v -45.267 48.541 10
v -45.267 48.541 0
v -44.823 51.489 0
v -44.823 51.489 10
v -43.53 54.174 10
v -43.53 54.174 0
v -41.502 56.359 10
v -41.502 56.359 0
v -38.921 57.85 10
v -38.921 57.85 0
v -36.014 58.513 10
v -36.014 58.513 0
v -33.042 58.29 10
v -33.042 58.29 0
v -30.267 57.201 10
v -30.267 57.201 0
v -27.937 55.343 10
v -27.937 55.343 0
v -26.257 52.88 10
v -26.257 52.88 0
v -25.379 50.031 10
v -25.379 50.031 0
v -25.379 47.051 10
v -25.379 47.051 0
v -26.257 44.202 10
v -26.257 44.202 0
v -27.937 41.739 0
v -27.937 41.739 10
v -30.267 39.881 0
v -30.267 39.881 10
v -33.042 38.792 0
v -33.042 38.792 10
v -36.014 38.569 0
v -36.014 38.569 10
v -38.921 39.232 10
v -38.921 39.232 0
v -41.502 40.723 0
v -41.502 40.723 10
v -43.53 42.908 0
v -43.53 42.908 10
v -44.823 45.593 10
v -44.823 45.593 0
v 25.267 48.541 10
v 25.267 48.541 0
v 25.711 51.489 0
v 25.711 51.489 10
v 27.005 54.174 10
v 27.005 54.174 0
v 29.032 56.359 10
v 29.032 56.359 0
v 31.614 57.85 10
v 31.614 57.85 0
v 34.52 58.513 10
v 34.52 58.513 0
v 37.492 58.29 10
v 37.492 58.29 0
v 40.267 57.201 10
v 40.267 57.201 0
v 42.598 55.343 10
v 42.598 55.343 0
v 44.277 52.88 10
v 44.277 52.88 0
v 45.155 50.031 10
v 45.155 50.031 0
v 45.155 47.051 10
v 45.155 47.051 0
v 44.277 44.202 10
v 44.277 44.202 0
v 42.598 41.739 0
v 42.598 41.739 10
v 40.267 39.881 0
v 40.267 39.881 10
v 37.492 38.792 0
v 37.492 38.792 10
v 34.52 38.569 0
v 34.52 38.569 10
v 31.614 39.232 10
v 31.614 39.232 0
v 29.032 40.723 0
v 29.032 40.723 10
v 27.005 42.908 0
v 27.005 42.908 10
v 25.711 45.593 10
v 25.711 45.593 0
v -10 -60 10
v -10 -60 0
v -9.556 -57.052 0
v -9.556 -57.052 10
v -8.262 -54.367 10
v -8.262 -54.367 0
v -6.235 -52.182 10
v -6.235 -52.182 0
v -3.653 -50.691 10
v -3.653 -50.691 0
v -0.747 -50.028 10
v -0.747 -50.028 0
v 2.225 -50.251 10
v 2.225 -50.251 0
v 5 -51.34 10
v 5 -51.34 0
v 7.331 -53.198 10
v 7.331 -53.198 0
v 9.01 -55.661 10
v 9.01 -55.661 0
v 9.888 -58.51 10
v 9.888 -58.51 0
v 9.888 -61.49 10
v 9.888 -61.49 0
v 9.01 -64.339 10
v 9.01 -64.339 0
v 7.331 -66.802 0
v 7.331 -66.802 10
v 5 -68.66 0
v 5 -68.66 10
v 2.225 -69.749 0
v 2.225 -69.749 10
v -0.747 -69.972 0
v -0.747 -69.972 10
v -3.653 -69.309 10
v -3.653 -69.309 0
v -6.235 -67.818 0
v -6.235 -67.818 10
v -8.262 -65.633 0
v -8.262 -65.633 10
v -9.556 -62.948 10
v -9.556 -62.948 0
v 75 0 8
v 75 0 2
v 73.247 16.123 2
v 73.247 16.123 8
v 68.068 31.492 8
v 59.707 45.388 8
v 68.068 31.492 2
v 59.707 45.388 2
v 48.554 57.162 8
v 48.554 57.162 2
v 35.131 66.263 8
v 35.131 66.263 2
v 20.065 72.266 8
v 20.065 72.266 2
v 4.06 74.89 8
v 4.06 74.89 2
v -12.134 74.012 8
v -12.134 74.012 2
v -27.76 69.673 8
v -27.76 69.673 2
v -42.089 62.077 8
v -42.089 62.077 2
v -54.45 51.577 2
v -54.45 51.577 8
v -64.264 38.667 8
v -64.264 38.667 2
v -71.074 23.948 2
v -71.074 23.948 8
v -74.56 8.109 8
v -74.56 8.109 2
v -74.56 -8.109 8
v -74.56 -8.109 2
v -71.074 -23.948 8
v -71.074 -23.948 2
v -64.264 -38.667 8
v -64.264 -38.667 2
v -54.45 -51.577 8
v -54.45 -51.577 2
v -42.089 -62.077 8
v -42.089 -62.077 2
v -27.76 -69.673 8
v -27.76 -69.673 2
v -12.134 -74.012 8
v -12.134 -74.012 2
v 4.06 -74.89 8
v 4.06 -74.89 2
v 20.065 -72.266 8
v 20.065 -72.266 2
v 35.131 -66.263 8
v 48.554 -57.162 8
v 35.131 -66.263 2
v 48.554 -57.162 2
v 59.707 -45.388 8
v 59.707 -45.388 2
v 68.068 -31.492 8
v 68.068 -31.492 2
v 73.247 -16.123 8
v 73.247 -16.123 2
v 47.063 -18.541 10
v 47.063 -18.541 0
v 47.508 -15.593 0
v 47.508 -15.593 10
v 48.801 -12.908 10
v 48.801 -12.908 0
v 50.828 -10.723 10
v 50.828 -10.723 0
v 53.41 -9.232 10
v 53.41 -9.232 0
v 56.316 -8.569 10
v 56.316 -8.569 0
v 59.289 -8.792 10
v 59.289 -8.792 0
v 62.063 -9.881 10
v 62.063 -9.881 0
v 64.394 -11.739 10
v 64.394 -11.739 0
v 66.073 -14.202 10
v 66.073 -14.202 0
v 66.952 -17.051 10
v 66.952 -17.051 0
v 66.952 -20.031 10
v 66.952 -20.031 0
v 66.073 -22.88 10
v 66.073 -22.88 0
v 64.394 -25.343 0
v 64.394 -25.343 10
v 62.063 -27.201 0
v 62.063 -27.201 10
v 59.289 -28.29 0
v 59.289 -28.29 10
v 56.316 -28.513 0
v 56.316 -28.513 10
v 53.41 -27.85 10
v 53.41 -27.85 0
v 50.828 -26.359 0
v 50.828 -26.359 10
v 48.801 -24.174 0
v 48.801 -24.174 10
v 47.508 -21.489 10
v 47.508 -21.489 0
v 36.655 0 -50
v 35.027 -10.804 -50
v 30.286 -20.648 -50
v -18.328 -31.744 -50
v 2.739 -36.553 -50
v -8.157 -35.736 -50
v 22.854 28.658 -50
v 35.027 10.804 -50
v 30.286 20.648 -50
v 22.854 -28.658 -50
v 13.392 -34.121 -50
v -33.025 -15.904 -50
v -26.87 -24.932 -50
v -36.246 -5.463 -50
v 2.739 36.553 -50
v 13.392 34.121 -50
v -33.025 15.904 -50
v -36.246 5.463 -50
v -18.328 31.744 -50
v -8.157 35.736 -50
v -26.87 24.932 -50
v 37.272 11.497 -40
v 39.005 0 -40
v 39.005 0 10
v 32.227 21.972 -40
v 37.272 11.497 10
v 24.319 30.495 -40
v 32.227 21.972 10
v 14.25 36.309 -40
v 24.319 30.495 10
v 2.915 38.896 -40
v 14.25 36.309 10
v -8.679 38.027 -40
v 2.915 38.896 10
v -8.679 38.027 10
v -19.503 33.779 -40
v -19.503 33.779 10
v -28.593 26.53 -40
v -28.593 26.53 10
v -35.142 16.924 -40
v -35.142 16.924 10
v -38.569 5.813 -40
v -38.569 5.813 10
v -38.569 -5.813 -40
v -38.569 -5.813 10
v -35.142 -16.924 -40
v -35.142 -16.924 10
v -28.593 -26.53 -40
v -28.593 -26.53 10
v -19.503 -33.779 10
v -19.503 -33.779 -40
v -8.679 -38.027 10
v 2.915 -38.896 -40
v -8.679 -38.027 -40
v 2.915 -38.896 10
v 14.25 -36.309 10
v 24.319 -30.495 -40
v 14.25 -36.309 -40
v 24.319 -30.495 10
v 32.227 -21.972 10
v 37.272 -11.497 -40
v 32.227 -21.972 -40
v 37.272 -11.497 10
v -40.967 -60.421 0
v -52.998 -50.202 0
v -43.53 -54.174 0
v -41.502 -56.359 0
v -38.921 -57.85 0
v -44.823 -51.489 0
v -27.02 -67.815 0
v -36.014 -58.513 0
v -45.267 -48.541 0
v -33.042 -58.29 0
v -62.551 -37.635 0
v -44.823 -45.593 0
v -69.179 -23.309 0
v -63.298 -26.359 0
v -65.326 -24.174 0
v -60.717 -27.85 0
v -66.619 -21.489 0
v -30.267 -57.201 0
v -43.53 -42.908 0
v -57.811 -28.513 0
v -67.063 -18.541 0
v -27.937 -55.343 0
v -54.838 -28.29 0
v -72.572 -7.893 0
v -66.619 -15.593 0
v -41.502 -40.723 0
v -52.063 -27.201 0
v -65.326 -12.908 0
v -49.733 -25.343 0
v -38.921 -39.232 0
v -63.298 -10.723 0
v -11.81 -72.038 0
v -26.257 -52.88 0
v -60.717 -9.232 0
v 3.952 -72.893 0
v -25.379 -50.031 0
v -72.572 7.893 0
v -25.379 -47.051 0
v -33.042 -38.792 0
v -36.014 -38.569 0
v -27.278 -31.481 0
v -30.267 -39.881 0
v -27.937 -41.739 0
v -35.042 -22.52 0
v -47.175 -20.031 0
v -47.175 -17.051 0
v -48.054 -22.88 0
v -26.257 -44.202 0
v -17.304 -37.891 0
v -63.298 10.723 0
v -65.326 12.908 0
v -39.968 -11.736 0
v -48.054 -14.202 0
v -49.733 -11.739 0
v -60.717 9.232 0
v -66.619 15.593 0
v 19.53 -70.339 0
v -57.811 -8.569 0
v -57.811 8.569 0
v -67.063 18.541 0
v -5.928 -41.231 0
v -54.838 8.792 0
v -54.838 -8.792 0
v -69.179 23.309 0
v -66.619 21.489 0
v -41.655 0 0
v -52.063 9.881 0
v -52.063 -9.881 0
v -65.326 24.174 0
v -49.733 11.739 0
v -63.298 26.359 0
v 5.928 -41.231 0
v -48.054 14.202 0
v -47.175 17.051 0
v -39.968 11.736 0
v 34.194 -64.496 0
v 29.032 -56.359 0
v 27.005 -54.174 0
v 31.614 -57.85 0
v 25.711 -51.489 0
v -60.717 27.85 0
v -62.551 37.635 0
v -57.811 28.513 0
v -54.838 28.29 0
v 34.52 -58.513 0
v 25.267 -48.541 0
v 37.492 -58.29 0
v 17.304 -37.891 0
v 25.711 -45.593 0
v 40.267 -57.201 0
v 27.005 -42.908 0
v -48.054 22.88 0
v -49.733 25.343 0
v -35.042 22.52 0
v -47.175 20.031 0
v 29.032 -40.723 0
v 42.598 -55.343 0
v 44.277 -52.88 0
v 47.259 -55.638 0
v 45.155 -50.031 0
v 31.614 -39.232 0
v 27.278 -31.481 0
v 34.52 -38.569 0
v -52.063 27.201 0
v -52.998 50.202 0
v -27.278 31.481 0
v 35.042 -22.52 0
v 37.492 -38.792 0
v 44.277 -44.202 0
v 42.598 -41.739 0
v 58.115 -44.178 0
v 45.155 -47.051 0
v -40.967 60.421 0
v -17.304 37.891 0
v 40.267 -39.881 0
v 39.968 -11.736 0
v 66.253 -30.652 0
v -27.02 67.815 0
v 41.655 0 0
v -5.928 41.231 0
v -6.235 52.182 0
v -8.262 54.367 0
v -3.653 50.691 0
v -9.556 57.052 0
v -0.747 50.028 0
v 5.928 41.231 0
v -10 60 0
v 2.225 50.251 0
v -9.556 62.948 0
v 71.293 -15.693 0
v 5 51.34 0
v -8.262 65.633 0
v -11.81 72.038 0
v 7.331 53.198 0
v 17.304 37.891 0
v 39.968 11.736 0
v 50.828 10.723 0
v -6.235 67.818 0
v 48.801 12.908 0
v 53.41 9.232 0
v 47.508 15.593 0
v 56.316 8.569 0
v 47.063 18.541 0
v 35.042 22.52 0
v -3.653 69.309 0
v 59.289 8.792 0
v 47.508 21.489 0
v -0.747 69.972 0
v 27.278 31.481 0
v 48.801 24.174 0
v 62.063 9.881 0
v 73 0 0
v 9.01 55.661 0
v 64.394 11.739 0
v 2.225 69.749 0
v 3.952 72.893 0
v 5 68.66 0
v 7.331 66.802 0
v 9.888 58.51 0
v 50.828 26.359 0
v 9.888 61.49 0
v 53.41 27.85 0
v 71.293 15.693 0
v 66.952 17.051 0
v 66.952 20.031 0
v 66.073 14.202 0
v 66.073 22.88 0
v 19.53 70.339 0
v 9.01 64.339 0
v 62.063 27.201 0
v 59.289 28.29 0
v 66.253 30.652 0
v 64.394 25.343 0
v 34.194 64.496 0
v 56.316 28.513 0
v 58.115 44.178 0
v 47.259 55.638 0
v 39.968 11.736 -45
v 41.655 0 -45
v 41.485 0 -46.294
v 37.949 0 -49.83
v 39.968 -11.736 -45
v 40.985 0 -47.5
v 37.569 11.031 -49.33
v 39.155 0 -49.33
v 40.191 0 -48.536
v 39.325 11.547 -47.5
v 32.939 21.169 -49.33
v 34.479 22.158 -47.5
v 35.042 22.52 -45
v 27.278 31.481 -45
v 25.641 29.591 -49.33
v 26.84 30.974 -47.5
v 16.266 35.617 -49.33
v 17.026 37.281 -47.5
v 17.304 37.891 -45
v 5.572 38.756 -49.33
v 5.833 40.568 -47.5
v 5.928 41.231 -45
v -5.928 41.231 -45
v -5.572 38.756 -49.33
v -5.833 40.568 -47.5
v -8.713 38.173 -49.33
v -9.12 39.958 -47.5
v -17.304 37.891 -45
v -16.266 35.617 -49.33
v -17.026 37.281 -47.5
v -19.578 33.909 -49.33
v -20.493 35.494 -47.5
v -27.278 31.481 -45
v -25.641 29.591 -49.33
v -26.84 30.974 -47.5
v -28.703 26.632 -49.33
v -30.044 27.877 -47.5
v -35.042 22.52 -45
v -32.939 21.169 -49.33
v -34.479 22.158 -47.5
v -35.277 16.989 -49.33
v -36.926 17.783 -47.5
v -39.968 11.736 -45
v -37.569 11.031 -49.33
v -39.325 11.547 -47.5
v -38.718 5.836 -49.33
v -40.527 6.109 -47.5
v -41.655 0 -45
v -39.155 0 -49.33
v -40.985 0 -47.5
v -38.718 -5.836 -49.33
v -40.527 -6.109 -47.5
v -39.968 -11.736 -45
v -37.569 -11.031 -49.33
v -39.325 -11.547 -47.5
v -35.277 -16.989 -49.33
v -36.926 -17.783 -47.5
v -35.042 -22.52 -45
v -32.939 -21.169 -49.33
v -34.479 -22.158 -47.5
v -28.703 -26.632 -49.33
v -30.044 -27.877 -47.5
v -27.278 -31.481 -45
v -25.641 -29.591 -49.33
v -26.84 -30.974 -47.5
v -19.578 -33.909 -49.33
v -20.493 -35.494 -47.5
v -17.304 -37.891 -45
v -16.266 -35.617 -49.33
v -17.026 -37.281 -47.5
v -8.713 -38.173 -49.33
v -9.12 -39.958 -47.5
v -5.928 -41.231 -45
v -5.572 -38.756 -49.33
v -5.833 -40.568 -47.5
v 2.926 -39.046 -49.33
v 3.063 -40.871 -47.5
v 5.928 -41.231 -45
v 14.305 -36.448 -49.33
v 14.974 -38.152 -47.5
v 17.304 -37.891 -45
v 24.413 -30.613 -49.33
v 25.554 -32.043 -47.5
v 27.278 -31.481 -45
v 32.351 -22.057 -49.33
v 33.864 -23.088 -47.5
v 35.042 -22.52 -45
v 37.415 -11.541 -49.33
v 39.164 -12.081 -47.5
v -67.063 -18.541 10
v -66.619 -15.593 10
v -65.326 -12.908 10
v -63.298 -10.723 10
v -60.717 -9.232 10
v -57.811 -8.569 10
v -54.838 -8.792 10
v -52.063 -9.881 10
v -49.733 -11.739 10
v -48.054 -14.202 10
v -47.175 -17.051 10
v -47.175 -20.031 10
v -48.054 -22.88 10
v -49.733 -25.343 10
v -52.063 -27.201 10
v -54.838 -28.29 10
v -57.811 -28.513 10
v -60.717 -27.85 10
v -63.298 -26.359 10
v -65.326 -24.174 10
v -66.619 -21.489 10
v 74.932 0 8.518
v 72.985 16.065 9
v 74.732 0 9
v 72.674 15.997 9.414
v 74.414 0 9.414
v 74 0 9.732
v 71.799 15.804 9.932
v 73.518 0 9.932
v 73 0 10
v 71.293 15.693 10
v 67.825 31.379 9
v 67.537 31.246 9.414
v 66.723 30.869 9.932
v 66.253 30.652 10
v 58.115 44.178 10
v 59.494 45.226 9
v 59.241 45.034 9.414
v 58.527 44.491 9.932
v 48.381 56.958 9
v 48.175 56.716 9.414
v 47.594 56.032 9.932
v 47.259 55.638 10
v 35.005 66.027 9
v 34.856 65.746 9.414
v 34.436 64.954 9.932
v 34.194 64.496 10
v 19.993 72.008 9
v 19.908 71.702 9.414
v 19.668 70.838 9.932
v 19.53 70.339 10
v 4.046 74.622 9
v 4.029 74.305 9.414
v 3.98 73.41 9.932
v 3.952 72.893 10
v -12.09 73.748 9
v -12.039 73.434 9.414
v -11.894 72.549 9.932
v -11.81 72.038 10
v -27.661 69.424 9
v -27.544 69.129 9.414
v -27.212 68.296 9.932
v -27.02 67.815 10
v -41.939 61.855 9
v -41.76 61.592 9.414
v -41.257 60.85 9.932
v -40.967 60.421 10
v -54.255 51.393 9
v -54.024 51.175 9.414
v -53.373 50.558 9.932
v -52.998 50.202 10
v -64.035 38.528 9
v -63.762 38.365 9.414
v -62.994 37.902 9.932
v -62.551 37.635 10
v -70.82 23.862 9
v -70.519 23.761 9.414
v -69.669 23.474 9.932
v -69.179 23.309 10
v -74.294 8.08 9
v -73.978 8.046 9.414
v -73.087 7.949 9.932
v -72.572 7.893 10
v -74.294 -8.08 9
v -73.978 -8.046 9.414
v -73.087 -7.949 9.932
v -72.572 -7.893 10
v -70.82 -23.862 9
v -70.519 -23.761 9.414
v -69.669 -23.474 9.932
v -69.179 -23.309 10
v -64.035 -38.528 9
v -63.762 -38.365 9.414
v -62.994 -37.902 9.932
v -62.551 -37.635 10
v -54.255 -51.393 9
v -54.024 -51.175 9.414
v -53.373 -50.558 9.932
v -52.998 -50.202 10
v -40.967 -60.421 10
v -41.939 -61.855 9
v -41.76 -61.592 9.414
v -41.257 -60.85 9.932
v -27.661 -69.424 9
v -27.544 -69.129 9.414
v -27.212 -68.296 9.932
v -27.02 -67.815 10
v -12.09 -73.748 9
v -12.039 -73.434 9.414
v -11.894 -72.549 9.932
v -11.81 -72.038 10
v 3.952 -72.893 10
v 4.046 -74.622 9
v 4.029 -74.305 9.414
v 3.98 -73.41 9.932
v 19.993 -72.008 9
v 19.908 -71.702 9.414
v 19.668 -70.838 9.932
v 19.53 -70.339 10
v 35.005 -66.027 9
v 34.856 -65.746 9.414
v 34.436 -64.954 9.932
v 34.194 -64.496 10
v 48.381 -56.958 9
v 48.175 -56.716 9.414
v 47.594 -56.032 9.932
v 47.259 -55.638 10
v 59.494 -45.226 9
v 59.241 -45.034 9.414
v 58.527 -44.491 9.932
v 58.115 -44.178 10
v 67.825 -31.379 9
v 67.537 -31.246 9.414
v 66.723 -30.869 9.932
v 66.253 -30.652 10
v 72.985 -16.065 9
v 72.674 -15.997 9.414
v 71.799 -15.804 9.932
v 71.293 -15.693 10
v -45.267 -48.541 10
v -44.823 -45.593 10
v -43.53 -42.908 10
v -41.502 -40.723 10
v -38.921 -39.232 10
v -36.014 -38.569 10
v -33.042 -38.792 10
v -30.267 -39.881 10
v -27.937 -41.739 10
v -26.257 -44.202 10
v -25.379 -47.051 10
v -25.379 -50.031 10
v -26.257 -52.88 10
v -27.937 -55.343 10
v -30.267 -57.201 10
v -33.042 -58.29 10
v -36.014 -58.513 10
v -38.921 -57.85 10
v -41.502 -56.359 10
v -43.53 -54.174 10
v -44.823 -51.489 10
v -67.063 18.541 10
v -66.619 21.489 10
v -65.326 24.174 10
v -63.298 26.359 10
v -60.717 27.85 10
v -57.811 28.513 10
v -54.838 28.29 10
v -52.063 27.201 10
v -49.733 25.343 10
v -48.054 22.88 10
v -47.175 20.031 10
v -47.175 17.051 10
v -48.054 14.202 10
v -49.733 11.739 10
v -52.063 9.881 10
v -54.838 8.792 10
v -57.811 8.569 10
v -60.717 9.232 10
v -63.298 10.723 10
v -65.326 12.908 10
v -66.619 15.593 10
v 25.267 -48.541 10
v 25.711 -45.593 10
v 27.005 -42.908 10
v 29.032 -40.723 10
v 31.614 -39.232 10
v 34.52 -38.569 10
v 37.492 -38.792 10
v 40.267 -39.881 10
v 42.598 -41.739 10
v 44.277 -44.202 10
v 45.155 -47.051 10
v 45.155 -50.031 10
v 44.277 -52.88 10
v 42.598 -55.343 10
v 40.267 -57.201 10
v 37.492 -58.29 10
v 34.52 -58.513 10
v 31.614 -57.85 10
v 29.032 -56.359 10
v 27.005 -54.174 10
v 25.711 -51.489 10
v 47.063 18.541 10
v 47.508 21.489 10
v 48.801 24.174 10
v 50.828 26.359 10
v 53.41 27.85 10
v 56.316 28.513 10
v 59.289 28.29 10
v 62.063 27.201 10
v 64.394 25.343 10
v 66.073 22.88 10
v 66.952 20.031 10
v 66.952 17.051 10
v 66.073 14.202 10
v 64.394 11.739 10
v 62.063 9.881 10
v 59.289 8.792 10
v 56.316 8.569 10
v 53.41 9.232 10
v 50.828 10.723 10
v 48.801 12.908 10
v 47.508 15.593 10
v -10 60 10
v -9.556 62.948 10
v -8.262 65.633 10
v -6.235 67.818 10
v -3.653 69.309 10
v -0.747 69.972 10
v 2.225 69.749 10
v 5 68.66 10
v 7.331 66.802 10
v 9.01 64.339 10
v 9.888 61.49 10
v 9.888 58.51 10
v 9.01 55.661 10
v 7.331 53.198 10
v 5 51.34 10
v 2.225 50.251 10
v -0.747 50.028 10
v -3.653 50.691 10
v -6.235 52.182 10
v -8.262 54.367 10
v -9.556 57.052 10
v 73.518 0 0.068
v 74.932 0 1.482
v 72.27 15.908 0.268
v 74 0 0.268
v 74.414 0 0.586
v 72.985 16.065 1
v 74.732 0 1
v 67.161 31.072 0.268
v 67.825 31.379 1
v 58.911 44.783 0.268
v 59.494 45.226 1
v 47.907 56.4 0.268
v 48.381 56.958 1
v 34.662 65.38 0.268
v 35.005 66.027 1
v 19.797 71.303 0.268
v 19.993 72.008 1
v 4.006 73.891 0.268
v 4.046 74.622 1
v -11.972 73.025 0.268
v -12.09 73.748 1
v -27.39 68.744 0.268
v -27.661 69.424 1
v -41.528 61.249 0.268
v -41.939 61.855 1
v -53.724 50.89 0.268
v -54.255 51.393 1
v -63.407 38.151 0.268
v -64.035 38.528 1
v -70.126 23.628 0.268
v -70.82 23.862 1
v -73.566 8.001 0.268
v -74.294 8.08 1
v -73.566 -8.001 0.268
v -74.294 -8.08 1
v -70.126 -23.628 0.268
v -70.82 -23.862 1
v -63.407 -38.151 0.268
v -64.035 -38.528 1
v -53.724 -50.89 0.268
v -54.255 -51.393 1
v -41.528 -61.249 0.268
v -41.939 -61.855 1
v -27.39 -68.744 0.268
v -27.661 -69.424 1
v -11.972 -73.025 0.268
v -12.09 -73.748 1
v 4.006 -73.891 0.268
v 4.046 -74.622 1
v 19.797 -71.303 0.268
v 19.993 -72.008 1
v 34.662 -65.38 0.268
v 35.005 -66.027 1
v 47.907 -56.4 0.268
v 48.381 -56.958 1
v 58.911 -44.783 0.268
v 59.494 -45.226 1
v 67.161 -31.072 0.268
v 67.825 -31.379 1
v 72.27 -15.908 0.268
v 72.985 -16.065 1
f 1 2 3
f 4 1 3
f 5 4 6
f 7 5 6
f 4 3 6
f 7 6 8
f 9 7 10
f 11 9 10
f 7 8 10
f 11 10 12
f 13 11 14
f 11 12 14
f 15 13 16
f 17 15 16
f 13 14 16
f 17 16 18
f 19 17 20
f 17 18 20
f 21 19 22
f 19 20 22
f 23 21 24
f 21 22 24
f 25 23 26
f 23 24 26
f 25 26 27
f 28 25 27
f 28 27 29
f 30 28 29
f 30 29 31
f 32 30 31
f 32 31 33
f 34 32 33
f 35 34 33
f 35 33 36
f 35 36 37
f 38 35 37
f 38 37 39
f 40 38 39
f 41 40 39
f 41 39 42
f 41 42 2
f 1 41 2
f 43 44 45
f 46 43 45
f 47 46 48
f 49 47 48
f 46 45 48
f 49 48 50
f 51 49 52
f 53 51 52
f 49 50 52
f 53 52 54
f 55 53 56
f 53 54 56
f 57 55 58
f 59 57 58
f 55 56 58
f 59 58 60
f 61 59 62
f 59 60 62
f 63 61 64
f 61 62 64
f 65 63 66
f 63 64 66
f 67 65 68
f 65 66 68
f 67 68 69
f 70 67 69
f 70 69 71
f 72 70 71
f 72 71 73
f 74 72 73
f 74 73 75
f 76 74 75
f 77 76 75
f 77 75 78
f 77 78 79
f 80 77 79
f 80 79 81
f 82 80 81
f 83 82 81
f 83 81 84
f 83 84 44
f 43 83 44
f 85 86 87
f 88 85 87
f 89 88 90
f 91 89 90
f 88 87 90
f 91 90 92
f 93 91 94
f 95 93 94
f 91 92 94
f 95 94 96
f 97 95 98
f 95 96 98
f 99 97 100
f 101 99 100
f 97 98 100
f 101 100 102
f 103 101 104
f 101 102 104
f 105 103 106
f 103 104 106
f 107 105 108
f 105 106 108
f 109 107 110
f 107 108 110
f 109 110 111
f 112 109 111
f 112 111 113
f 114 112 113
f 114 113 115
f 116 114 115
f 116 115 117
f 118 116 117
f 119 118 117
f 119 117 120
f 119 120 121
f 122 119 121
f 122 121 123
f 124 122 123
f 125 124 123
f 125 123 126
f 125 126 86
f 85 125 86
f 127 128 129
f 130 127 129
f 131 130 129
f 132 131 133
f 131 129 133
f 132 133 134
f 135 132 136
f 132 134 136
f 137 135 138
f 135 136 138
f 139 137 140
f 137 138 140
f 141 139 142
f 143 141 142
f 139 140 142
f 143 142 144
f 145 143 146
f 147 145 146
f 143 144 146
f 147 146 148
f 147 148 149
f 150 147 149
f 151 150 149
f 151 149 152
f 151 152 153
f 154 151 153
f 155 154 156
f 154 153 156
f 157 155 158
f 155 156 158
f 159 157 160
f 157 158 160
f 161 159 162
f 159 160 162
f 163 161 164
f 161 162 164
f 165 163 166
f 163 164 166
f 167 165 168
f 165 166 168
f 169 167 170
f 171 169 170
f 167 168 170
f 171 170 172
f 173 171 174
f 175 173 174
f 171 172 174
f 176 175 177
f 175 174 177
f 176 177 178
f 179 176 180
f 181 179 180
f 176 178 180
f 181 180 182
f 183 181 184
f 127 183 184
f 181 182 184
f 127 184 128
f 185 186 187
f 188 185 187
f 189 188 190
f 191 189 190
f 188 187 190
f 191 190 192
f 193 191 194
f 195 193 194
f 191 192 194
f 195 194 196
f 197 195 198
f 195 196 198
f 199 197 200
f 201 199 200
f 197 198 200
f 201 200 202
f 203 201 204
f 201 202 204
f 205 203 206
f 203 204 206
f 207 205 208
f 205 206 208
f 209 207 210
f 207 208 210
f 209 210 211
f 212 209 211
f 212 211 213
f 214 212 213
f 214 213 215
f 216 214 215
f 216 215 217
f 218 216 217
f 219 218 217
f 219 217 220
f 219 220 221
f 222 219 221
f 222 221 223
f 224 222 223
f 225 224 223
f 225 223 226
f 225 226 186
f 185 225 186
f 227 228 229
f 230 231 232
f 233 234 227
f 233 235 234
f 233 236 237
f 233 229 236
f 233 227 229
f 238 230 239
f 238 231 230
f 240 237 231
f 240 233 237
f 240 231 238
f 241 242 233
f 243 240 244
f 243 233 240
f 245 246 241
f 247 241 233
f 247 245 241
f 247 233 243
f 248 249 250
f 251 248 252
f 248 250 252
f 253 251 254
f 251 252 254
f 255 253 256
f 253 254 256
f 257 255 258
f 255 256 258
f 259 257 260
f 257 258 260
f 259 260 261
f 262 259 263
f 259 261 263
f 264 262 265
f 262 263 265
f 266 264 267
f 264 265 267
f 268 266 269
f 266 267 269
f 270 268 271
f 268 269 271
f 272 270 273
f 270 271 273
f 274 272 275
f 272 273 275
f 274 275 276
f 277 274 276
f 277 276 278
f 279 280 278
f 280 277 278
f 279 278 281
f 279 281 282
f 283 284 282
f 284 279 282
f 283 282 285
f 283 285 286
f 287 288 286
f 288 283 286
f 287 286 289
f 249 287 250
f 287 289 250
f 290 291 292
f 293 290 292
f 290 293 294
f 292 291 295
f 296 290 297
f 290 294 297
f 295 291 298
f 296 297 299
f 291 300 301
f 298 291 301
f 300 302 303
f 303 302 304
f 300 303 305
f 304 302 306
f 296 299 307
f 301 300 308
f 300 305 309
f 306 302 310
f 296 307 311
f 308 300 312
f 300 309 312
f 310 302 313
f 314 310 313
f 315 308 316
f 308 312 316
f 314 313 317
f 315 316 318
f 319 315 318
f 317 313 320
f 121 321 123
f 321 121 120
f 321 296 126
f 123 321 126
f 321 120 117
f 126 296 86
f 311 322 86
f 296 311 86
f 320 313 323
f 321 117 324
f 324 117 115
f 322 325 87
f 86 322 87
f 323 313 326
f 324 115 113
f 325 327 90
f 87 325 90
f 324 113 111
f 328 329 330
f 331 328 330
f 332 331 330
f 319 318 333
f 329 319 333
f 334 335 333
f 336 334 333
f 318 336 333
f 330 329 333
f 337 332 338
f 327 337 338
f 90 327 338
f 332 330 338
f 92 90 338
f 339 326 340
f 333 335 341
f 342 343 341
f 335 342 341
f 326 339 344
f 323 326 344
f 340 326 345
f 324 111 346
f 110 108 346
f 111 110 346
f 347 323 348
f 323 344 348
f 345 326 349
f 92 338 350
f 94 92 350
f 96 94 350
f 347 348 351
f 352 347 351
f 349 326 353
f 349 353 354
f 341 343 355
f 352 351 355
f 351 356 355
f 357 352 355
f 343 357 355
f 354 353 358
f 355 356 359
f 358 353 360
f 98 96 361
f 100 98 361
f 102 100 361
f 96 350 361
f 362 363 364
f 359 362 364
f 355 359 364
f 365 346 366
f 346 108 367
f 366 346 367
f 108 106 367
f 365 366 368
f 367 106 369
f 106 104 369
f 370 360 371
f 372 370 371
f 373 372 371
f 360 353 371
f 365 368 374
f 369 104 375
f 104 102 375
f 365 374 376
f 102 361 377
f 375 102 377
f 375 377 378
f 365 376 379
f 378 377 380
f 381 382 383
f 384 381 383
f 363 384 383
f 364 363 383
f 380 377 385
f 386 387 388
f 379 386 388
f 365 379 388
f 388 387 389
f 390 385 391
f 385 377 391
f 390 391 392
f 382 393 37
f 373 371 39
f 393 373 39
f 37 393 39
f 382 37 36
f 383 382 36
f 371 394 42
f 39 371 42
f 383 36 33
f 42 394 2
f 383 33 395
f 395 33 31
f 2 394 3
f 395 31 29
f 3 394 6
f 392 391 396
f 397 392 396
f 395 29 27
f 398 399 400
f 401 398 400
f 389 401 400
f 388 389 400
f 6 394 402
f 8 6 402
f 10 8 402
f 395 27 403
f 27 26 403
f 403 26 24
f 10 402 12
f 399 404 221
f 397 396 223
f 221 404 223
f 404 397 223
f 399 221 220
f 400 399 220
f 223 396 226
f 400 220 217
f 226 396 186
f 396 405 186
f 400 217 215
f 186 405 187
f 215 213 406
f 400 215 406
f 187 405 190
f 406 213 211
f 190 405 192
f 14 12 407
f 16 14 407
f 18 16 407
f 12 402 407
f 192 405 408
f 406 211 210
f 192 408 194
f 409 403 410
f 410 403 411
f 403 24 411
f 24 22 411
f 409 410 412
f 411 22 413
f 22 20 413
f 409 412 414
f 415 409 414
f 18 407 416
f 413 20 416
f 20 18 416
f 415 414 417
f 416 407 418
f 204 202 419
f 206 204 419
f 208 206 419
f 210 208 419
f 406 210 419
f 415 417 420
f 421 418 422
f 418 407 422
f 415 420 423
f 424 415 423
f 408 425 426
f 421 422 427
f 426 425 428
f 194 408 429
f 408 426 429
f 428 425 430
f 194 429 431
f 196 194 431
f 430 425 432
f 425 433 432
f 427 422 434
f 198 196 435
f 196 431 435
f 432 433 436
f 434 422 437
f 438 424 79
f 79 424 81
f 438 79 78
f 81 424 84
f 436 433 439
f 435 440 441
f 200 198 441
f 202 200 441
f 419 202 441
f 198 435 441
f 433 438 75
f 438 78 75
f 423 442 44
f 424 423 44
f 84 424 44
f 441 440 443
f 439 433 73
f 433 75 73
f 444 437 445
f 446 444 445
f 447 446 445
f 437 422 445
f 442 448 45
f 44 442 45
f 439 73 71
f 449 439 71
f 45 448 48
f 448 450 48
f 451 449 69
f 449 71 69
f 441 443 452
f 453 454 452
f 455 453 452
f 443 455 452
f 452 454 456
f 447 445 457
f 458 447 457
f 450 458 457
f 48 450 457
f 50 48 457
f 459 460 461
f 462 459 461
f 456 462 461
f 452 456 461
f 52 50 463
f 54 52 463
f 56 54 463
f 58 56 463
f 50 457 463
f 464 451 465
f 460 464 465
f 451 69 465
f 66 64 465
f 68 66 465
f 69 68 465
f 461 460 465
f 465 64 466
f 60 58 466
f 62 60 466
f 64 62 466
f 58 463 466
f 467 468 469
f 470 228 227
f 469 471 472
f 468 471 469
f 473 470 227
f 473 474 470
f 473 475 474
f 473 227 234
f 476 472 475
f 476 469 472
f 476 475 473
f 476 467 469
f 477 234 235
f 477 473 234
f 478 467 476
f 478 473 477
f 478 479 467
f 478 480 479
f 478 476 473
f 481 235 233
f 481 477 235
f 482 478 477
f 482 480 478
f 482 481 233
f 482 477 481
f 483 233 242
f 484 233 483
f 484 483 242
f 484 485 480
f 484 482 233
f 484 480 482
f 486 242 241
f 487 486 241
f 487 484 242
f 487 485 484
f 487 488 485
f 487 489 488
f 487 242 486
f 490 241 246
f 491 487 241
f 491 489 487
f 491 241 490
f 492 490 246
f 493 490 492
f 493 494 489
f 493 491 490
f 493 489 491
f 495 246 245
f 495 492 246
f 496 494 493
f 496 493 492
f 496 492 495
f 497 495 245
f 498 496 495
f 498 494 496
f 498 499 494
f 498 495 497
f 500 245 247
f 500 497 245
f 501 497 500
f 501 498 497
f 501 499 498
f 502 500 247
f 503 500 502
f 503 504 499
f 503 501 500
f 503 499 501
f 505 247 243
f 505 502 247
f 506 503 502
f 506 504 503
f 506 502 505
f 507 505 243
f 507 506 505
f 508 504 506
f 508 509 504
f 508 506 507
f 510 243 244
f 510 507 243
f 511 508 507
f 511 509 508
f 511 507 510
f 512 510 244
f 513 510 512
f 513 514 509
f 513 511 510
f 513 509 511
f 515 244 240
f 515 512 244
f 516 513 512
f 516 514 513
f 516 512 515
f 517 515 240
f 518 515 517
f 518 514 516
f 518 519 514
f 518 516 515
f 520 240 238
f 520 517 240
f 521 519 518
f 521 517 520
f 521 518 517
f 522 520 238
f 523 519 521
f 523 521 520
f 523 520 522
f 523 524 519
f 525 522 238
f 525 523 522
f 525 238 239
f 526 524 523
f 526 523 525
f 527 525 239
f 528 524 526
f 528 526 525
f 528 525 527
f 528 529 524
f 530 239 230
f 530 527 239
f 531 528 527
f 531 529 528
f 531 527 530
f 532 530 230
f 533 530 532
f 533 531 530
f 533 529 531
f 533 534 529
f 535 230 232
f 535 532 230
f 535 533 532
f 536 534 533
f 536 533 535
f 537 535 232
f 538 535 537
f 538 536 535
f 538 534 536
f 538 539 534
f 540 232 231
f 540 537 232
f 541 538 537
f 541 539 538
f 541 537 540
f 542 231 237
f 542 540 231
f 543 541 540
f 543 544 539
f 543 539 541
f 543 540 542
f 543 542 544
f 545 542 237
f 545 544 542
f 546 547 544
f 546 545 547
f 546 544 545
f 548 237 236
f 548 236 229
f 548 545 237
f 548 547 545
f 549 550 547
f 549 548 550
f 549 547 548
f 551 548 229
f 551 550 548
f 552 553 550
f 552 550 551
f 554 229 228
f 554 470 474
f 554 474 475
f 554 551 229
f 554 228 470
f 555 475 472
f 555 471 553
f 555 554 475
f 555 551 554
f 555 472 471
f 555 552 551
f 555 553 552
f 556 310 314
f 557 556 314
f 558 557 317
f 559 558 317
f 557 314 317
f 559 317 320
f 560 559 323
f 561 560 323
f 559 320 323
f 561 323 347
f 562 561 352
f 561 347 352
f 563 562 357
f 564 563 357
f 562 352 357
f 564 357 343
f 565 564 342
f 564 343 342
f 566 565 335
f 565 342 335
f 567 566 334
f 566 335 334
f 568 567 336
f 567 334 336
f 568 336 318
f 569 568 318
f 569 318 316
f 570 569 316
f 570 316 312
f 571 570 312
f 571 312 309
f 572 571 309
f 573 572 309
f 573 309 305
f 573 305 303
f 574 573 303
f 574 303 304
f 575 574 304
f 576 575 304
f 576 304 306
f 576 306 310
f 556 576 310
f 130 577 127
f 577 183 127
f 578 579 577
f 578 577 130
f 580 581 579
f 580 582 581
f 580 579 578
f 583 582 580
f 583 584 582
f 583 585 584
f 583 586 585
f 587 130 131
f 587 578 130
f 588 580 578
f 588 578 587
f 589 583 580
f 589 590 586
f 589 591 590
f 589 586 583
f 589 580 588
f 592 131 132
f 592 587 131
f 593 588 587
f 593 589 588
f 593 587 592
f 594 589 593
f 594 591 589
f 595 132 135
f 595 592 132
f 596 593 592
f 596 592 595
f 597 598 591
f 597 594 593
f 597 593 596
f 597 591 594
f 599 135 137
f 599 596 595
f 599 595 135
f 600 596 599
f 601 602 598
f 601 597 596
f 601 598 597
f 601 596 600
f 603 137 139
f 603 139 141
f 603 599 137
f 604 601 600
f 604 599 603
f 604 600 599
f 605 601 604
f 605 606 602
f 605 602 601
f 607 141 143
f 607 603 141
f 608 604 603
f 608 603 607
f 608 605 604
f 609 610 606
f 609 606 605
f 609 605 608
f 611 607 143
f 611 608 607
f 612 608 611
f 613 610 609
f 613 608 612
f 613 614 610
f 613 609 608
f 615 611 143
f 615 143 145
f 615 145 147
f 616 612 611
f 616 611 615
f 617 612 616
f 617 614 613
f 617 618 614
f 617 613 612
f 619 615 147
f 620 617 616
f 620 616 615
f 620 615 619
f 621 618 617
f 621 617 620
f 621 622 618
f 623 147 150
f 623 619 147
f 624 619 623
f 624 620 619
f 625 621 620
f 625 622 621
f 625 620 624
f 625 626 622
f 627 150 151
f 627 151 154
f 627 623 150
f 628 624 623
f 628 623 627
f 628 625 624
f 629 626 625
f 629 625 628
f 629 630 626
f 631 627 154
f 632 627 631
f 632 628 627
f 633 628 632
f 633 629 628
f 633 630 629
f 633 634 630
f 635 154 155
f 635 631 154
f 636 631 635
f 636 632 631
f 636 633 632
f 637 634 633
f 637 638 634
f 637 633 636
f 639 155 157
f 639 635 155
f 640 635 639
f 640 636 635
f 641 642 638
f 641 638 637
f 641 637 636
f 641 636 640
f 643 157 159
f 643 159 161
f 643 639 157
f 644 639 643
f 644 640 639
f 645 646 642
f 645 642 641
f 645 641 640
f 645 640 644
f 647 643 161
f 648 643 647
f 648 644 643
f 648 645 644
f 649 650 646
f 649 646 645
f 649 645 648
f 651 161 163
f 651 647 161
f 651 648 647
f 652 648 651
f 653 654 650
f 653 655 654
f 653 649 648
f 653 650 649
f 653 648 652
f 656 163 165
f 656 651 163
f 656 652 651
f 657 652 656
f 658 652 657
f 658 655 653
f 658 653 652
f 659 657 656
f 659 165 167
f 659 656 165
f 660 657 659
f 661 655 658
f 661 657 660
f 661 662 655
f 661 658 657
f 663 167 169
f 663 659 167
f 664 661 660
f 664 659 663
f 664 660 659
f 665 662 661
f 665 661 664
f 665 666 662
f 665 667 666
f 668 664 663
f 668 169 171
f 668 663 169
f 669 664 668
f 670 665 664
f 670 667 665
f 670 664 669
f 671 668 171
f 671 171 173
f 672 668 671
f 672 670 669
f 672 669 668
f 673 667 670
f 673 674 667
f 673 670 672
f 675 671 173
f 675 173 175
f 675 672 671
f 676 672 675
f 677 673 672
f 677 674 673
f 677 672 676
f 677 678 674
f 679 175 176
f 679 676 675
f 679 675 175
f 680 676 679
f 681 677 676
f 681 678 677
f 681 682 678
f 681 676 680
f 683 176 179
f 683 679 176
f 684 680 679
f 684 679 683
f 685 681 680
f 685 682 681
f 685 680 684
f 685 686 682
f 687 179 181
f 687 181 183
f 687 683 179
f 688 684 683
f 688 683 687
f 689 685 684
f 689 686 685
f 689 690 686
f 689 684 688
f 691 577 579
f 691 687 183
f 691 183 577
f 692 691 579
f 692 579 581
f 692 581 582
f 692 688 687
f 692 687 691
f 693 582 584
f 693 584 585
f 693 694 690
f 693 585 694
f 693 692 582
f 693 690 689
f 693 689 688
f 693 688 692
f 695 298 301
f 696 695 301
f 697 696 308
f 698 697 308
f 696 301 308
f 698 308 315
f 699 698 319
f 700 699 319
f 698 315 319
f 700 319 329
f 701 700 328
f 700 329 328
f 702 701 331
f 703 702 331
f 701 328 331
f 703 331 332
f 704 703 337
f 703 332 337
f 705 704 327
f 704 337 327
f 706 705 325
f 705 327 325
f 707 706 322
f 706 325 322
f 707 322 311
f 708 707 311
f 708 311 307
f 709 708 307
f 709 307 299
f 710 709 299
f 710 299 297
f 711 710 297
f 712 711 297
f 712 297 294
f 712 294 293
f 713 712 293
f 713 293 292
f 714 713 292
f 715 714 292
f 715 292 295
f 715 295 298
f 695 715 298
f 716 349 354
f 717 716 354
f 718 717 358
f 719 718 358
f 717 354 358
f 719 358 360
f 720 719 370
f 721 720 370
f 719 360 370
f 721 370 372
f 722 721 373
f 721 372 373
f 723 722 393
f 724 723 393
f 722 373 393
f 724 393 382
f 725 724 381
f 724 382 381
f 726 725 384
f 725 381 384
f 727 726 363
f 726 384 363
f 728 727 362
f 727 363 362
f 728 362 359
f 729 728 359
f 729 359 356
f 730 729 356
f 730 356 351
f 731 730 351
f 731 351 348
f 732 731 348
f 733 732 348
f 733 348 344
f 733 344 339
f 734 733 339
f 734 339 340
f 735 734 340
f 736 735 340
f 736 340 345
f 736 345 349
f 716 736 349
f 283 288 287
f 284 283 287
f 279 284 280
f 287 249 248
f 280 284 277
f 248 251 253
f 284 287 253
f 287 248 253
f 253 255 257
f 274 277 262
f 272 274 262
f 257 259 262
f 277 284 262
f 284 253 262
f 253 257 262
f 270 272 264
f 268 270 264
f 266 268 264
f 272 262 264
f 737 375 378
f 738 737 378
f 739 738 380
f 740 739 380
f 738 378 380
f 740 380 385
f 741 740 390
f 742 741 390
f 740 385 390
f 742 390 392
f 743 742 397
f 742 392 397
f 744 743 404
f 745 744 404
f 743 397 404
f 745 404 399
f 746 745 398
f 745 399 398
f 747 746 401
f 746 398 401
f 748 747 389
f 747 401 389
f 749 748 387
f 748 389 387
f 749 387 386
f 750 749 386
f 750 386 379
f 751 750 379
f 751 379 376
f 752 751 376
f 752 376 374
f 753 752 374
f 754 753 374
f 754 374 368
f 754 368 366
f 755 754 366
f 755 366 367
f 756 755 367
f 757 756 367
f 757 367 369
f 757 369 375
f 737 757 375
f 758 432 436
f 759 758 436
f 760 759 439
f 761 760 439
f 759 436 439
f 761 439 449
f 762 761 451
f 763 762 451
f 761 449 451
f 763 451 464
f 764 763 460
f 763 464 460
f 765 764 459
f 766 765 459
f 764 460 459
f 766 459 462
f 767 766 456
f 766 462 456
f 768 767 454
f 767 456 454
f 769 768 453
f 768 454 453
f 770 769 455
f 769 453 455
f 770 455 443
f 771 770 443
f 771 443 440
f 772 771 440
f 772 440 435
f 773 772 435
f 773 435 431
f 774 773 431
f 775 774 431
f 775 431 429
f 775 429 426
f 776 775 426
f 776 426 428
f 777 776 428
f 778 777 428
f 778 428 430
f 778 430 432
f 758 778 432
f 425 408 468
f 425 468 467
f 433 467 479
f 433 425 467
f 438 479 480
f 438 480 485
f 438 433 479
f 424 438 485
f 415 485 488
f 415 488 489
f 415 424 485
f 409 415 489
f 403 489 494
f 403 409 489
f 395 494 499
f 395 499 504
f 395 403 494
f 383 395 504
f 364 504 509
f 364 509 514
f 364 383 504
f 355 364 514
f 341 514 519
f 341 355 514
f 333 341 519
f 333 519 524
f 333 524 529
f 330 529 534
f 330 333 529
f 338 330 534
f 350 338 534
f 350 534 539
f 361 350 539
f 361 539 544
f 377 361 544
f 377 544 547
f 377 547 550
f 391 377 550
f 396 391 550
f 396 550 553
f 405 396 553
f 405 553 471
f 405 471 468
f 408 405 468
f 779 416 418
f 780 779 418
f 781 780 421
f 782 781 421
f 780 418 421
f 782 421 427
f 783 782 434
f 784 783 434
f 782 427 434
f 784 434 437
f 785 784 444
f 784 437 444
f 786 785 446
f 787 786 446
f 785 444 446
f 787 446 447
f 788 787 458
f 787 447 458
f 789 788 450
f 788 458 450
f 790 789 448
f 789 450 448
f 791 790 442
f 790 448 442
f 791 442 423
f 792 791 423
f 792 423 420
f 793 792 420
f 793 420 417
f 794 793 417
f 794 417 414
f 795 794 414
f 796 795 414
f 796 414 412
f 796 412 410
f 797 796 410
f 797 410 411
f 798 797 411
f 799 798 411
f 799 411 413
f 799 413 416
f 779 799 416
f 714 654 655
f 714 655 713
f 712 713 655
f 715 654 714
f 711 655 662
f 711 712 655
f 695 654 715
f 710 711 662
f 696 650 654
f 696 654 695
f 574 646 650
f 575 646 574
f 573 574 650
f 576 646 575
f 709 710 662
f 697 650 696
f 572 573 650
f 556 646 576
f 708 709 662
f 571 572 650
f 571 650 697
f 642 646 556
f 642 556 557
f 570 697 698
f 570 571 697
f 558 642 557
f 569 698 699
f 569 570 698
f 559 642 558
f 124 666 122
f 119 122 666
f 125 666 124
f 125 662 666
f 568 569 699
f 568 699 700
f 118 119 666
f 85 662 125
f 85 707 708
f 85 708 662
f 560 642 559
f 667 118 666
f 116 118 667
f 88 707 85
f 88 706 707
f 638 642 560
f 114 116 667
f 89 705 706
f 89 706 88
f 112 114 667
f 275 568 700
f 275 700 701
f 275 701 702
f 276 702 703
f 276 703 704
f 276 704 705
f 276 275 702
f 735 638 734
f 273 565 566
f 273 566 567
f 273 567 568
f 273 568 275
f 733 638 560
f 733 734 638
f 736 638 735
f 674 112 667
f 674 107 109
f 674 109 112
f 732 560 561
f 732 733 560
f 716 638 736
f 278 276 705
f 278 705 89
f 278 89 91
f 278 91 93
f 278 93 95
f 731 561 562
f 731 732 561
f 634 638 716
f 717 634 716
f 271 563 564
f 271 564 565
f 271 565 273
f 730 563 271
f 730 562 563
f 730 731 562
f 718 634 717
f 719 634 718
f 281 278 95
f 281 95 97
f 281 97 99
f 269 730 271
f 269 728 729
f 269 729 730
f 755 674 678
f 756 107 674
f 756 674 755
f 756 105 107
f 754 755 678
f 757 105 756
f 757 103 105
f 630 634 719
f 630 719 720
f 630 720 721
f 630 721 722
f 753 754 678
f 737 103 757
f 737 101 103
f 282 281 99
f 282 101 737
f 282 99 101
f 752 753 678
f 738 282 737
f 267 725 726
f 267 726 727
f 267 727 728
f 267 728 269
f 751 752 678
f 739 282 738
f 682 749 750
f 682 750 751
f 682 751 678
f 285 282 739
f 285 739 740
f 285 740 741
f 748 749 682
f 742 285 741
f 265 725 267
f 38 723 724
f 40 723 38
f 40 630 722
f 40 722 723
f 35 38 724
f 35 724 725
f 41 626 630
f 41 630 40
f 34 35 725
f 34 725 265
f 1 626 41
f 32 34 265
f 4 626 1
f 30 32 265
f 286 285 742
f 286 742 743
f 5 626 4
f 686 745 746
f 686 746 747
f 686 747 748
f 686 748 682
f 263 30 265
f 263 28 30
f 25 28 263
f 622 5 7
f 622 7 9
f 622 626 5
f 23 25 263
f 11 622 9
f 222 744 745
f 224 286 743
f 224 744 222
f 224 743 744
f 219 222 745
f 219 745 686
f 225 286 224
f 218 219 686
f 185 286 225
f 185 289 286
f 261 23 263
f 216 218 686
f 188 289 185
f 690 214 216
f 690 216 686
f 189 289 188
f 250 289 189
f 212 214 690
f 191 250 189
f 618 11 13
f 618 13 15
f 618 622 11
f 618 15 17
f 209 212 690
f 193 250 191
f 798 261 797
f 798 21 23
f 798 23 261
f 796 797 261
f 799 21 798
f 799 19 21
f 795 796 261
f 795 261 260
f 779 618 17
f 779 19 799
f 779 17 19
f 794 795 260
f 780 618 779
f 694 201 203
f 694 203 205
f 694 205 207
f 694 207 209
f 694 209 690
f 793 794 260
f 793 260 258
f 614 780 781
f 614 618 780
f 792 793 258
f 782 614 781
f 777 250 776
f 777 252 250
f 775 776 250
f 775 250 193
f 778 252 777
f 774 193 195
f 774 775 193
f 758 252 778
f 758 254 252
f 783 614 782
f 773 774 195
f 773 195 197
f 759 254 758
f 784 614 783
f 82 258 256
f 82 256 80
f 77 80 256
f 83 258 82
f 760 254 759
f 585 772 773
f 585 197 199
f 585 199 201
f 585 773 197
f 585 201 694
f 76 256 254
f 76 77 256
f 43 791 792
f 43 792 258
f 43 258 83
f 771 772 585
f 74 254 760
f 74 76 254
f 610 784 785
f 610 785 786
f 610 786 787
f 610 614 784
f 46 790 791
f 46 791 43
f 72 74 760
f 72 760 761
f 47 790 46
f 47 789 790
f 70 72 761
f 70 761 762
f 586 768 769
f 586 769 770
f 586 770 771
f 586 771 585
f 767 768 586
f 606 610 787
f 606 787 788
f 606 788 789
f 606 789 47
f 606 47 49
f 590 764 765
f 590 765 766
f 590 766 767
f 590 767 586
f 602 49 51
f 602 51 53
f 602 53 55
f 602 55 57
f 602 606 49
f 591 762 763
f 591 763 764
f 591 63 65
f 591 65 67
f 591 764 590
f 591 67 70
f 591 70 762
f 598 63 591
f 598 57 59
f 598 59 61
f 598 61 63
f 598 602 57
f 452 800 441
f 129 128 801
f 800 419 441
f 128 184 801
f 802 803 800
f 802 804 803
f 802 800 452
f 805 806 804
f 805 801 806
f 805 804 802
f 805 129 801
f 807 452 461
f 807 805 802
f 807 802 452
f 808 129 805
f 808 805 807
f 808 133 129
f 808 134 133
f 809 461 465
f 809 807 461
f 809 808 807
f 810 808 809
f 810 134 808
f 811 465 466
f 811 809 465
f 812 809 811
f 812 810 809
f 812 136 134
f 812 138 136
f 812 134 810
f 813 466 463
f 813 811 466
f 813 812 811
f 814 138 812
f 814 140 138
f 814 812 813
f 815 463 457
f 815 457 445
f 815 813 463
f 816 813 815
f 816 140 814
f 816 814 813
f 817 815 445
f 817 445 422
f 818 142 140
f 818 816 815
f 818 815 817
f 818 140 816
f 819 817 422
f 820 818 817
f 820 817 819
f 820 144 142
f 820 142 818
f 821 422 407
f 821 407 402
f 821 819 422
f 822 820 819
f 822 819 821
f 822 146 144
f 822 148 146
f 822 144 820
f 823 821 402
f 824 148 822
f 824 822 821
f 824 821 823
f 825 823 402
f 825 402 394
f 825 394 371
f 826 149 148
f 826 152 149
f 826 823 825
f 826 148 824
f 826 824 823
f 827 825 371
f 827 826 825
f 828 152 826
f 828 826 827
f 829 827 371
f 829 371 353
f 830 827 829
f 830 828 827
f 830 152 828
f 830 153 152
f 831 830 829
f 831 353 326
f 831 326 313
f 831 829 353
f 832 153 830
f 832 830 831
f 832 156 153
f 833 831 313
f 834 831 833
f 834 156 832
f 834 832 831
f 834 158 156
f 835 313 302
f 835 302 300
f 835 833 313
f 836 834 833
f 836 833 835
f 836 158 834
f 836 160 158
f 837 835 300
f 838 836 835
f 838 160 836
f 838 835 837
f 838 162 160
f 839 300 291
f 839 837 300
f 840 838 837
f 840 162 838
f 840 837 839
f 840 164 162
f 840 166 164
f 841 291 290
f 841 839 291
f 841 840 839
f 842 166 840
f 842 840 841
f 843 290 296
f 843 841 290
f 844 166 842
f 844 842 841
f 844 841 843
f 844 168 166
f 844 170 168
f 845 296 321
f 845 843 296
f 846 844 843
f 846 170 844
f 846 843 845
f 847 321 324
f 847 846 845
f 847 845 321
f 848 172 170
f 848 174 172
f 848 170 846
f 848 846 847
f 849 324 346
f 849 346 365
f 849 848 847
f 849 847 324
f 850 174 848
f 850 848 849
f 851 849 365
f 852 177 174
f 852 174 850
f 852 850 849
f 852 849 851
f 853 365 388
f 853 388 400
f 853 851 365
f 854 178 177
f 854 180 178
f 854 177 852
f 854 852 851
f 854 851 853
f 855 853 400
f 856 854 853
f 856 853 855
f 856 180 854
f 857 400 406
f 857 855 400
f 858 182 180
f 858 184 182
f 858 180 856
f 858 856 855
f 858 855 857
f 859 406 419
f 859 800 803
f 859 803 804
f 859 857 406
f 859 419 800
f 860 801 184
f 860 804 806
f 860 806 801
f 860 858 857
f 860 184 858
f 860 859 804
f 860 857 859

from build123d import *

# Parameters (mm, degrees)
SKETCH2_R           = 75
SKETCH2_R_2         = 40
EXTRUDE_THIN1_DEPTH = 10
SKETCH3_R           = 41.655
SKETCH3_R_2         = 39.005
EXTRUDE_THIN2_DEPTH = 60
SKETCH4_R           = 39.005
BOSS_EXTRUDE1_DEPTH = 10
SKETCH5_R           = 10
CUT_EXTRUDE1_DEPTH  = 11
FILLET1_R           = 5
FILLET2_R           = 2


with BuildPart() as part:
    # Sketch2 → Extrude-Thin1 (new body)
    with BuildSketch(Plane.XY):
        Circle(SKETCH2_R)
        Circle(SKETCH2_R_2, mode=Mode.SUBTRACT)
    extrude(amount=EXTRUDE_THIN1_DEPTH)

    # Sketch3 → Extrude-Thin2 (add)
    with BuildSketch(Plane.XY.offset(10)):
        Circle(SKETCH3_R)
        Circle(SKETCH3_R_2, mode=Mode.SUBTRACT)
    extrude(amount=-EXTRUDE_THIN2_DEPTH)

    # Sketch4 → Boss-Extrude1 (add)
    with BuildSketch(Plane(origin=(0, 0, -50), x_dir=(-1, 0, 0), z_dir=(0, 0, -1))):
        Circle(SKETCH4_R)
    extrude(amount=-BOSS_EXTRUDE1_DEPTH)

    # Sketch5 → Cut-Extrude1 (cut, through all)
    with BuildSketch(Plane(origin=(0, 0, 0), x_dir=(-1, 0, 0), z_dir=(0, 0, -1))):
        with Locations((0, 60)):
            Circle(SKETCH5_R)
        with Locations((35.267115138, 48.541019662)):
            Circle(SKETCH5_R)
        with Locations((57.063390978, 18.541019662)):
            Circle(SKETCH5_R)
        with Locations((57.063390978, -18.541019662)):
            Circle(SKETCH5_R)
        with Locations((35.267115138, -48.541019662)):
            Circle(SKETCH5_R)
        with Locations((0, -60)):
            Circle(SKETCH5_R)
        with Locations((-35.267115138, -48.541019662)):
            Circle(SKETCH5_R)
        with Locations((-57.063390978, -18.541019662)):
            Circle(SKETCH5_R)
        with Locations((-57.063390978, 18.541019662)):
            Circle(SKETCH5_R)
        with Locations((-35.267115138, 48.541019662)):
            Circle(SKETCH5_R)
    extrude(amount=-CUT_EXTRUDE1_DEPTH, mode=Mode.SUBTRACT)

    # Fillet1
    fillet1_edges = [part.edges().sort_by_distance(p)[0] for p in [
        (-41.655, 0, -50),
    ]]
    fillet(fillet1_edges, radius=FILLET1_R)

    # Fillet2
    fillet2_edges = [part.edges().sort_by_distance(p)[0] for p in [
        (-75, 0, 0),
        (-75, 0, 10),
    ]]
    fillet(fillet2_edges, radius=FILLET2_R)


solid = part.part
